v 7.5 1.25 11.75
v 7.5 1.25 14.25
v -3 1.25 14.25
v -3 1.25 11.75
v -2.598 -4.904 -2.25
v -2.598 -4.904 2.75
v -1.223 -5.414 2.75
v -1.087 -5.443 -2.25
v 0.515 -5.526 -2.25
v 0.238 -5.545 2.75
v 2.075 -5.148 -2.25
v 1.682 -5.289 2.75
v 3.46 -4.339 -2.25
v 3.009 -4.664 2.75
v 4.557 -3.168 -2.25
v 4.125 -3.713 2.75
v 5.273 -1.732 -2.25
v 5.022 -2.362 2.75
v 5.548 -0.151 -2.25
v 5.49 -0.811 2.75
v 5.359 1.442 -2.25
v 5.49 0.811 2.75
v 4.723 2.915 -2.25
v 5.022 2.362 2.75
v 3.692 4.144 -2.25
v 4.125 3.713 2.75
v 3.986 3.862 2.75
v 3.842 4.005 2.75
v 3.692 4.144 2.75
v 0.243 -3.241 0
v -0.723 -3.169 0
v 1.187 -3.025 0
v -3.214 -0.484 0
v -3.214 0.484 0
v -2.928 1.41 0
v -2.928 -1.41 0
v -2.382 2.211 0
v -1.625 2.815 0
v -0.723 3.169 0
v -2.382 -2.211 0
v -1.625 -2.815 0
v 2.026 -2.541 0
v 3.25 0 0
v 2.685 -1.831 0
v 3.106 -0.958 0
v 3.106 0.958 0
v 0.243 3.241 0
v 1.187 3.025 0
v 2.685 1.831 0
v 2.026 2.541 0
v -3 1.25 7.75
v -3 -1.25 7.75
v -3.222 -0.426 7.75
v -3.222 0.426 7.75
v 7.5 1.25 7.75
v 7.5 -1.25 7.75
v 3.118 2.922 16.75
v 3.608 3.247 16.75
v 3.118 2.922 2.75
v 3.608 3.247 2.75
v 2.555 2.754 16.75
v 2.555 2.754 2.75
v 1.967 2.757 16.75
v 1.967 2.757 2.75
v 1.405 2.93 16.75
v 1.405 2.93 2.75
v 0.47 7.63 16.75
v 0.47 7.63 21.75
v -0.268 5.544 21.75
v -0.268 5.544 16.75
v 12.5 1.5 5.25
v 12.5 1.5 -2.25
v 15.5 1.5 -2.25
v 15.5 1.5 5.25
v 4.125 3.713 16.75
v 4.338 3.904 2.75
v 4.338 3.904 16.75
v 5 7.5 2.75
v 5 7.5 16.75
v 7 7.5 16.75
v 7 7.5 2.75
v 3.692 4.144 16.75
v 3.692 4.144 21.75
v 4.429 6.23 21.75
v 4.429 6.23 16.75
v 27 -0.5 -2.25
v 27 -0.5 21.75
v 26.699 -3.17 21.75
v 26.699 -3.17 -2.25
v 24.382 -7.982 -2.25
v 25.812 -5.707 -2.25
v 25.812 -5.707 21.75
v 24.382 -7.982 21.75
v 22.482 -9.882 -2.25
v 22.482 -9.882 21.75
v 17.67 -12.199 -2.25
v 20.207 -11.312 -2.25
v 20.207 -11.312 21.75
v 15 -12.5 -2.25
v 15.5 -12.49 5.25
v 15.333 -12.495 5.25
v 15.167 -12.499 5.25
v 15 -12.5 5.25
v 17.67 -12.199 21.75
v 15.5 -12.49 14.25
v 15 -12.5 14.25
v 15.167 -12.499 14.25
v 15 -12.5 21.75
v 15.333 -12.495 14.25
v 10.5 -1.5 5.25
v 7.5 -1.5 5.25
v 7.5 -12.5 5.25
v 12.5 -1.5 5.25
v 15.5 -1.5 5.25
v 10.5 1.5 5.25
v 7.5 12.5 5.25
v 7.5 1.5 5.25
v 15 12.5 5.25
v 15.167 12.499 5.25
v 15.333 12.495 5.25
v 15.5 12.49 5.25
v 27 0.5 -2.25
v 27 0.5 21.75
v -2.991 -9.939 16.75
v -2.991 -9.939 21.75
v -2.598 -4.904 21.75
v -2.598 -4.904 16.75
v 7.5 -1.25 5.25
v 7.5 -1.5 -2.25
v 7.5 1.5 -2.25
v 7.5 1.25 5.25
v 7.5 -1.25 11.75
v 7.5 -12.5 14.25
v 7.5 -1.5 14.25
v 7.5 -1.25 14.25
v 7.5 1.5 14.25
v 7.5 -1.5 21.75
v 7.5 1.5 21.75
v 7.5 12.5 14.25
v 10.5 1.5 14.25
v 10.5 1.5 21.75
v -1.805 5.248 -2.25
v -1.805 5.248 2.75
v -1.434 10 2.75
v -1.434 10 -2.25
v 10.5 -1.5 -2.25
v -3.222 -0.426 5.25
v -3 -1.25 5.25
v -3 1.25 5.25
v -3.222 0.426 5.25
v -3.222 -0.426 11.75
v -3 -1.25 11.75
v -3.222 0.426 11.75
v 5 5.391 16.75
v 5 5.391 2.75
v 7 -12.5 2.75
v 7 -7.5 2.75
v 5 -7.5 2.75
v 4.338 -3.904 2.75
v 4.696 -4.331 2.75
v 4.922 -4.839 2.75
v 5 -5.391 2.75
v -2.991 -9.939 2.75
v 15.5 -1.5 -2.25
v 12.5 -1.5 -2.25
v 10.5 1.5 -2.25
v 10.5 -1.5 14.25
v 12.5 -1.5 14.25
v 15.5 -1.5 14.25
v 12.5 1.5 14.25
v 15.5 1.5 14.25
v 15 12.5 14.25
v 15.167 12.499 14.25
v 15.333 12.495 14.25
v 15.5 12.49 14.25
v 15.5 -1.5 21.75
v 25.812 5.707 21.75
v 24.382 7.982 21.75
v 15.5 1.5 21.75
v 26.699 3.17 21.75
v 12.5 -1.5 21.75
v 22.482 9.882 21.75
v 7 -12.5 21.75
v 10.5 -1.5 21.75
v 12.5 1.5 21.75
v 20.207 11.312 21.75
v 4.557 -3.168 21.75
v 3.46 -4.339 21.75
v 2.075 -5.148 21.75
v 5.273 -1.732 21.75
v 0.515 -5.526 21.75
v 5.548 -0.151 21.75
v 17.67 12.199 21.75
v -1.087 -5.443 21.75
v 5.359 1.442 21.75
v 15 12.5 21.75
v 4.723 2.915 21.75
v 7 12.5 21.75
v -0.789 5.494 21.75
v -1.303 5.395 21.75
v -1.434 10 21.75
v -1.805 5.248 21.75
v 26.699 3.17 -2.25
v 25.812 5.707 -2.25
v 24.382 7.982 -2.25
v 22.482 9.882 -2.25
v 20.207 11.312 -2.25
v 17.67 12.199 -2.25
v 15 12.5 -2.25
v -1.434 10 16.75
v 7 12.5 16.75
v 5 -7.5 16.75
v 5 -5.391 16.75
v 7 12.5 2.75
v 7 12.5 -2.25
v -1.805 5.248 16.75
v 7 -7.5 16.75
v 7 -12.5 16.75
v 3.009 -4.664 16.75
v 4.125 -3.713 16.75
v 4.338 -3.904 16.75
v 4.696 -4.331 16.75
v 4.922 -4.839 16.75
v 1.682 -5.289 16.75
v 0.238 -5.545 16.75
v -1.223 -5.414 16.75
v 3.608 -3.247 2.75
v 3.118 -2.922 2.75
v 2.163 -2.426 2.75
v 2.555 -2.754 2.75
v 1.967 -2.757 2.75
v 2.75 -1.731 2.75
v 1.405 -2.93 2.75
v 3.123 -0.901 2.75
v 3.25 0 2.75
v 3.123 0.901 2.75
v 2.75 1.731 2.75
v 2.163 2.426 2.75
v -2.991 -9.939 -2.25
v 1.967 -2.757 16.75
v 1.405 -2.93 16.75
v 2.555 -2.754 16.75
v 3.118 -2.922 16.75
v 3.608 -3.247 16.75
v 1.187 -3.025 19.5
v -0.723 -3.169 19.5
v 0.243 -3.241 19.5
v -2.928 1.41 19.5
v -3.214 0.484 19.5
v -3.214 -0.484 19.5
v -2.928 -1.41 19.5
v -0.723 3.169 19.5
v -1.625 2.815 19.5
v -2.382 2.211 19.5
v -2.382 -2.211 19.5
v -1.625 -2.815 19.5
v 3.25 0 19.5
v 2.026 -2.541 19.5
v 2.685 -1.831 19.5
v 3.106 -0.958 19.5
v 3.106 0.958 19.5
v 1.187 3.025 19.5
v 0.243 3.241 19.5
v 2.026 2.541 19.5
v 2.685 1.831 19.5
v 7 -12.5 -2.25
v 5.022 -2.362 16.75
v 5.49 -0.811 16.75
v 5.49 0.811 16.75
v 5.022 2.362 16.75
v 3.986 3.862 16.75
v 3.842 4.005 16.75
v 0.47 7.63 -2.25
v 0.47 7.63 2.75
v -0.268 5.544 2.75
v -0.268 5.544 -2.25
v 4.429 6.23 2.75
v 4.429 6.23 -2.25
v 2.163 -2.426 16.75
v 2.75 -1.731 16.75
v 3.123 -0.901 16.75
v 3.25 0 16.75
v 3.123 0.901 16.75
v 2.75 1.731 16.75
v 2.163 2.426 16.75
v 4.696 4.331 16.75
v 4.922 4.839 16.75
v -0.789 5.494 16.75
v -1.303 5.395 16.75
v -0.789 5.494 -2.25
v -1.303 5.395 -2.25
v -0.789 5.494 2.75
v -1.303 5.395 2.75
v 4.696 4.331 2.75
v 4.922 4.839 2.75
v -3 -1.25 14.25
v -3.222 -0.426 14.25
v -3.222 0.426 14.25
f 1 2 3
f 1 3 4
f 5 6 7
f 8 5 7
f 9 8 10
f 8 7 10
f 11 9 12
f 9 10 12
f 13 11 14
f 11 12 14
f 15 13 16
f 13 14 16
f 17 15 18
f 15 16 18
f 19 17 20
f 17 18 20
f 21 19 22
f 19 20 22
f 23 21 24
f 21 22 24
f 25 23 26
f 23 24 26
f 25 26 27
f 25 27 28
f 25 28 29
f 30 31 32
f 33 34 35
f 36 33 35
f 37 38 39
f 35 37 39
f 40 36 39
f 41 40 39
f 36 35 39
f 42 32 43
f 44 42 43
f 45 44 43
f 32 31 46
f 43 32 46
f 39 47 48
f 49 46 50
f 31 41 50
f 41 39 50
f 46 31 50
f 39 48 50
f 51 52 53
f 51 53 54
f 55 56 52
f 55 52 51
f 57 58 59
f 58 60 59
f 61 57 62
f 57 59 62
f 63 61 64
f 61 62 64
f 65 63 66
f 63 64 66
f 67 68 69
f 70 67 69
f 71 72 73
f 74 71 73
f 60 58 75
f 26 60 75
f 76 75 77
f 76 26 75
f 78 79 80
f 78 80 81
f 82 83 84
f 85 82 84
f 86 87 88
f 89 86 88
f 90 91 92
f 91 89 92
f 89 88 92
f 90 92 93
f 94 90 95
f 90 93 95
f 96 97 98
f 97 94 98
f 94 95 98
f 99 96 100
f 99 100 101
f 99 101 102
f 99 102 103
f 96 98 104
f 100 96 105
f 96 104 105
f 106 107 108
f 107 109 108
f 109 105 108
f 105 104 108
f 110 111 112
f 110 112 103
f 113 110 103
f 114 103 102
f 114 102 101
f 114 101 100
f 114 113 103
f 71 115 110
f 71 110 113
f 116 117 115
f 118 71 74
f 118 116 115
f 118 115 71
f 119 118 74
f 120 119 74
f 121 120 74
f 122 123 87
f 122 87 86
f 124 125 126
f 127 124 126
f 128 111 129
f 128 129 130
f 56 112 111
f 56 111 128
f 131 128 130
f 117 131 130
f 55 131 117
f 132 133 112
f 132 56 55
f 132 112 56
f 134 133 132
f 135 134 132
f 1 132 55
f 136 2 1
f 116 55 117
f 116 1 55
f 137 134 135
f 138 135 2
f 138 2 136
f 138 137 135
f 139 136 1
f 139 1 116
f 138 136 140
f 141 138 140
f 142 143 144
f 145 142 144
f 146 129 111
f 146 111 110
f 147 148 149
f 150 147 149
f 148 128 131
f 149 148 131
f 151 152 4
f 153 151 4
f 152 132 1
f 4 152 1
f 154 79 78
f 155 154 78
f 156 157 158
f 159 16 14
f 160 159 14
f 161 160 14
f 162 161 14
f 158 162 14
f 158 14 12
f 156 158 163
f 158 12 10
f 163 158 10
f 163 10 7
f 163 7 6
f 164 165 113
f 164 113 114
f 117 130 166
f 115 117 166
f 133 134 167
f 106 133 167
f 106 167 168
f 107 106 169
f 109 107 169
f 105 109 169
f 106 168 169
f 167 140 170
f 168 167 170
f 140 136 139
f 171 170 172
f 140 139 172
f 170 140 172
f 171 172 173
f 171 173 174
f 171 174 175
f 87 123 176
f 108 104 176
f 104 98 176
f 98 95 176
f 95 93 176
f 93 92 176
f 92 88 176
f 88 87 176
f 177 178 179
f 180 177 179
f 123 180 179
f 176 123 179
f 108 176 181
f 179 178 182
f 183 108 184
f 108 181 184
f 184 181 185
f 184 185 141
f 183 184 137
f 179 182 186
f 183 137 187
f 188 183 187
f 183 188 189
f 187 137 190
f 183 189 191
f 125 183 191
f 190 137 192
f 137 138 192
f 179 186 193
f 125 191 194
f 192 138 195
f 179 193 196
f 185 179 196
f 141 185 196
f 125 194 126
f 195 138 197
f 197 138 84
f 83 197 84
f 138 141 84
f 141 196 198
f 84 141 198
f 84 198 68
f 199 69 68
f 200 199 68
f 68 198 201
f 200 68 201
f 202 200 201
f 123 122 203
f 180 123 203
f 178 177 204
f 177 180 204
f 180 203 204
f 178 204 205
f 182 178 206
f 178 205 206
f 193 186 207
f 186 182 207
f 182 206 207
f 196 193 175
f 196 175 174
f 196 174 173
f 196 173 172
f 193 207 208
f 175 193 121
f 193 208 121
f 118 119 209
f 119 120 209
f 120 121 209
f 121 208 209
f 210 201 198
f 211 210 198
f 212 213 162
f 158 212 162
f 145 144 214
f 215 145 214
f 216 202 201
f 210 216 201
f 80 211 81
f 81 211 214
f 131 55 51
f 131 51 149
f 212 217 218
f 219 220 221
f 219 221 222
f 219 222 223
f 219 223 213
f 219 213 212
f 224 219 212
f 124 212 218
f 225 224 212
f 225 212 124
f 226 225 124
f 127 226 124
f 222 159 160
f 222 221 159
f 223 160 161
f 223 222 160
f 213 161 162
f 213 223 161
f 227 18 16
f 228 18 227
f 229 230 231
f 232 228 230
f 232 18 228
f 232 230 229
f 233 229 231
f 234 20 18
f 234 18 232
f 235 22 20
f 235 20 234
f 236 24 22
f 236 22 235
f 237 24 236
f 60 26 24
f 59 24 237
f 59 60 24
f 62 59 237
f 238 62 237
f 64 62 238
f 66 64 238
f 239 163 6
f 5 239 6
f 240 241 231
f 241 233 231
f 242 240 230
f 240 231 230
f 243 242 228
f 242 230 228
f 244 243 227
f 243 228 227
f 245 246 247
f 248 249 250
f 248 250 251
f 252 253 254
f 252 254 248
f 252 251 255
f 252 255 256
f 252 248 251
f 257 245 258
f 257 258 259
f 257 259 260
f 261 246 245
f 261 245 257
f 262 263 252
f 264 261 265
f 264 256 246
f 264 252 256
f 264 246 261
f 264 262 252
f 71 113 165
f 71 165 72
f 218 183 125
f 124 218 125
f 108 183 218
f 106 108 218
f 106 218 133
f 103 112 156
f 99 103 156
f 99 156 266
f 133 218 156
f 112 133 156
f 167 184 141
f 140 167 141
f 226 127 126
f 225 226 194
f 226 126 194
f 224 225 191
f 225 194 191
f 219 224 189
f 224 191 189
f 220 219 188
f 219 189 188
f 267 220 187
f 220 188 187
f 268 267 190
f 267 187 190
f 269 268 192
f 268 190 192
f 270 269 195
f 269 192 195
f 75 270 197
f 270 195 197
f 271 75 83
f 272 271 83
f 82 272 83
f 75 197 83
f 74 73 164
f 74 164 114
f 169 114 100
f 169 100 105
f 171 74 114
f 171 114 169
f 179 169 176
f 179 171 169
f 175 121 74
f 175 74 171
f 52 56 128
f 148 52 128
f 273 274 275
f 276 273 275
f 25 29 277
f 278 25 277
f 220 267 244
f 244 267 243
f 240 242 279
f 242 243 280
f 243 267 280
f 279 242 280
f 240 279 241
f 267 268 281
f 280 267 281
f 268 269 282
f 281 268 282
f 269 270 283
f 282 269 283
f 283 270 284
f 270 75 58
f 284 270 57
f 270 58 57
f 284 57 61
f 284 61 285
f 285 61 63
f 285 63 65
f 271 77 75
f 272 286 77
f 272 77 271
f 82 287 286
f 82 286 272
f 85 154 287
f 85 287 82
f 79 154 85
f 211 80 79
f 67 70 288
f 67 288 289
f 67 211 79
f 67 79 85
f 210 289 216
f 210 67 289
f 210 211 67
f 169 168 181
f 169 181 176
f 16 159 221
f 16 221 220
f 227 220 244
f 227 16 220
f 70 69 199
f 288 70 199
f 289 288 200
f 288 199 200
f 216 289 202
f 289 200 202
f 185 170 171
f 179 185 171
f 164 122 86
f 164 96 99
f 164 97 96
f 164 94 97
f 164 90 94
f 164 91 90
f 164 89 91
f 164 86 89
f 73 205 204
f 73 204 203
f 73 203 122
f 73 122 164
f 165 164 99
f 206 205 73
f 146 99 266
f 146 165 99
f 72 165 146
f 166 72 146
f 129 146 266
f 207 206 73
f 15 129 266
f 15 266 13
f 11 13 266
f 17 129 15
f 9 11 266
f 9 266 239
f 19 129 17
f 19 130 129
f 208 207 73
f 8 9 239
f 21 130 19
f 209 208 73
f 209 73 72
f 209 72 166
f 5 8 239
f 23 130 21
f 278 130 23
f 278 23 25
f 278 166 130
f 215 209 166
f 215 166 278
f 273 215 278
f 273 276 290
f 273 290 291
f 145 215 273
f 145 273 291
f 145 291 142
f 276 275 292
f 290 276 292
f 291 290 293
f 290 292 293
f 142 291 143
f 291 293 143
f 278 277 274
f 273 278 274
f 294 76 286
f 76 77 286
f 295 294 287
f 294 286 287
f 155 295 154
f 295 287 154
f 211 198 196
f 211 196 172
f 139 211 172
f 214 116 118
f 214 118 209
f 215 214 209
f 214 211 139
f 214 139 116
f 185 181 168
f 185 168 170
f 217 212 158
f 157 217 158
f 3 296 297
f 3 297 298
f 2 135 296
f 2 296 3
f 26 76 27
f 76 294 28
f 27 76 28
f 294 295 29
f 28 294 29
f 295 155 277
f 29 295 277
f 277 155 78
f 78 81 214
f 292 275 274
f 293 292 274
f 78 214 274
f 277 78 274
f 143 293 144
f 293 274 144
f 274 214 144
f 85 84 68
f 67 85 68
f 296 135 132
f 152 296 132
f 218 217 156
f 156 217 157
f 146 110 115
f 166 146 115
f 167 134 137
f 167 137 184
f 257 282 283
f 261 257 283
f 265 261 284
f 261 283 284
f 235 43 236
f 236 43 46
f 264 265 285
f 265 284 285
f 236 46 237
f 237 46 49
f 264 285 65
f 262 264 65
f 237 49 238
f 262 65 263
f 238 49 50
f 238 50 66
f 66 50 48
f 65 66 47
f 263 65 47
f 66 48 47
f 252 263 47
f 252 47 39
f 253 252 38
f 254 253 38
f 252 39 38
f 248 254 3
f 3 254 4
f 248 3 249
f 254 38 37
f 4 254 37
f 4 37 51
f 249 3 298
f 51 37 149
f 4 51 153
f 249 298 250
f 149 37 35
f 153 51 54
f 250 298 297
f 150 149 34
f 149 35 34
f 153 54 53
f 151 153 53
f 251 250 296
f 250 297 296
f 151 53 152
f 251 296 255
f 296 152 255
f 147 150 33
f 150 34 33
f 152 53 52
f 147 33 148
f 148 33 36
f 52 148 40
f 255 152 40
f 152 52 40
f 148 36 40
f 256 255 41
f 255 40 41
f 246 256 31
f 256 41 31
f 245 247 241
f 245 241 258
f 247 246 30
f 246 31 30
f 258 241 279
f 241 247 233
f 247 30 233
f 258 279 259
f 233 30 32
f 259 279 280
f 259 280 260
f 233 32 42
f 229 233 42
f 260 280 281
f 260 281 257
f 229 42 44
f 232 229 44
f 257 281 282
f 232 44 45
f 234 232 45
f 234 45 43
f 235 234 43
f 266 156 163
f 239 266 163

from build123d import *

# Parameters (mm, degrees)
SKETCH_1_R          = 3.25
EXTRUDE_1_DEPTH     = 19.5
SKETCH_2_W          = 14
SKETCH_2_H          = 15
EXTRUDE_2_DEPTH     = 2
EXTRUDE_3_DEPTH     = 14
FILLET_1_R          = 2
SKETCH_5_W          = 24
SKETCH_5_H          = 25
EXTRUDE_4_DEPTH     = 20
SKETCH_6_W          = 2.5
SKETCH_6_H          = 2.5
CUT_EXTRUDE_1_DEPTH = 40.298536868
SKETCH_7_W          = 3
SKETCH_7_H          = 3
CUT_EXTRUDE_2_DEPTH = 39.226299847
SKETCH_8_W          = 8
SKETCH_8_H          = 9
CUT_EXTRUDE_3_DEPTH = 43.744151647
SKETCH_9_W          = 2.5
SKETCH_9_H          = 2.5
EXTRUDE_5_DEPTH     = 11.5
FILLET_7_R          = 12
EXTRUDE_6_DEPTH     = 5
EXTRUDE_START       = -5
EXTRUDE_7_DEPTH     = 5


with BuildPart() as part:
    # ｽｹｯﾁ1 → ﾎﾞｽ - 押し出し1 (new body)
    with BuildSketch(Plane.XY):
        Circle(SKETCH_1_R)
    extrude(amount=EXTRUDE_1_DEPTH)



with BuildPart() as body_2:
    # ｽｹｯﾁ2 → ﾎﾞｽ - 押し出し2 (new body)
    with BuildSketch(Plane(origin=(5, 0, 0), x_dir=(0, 0, -1), z_dir=(1, 0, 0))):
        with Locations((-9.75, 0)):
            Rectangle(SKETCH_2_W, SKETCH_2_H)
    extrude(amount=EXTRUDE_2_DEPTH)


with BuildPart() as part_1:
    add(part.part)

    add(body_2.part)  # ﾎﾞｽ - 押し出し3 merges body 2
    # ｽｹｯﾁ3 → ﾎﾞｽ - 押し出し3 (add)
    with BuildSketch(Plane(origin=(0, 0, 2.75), x_dir=(-1, 0, 0), z_dir=(0, 0, -1))):
        Polygon((0, 0), (-5, 4.5), (-5, -4.5), align=None)
    extrude(amount=-EXTRUDE_3_DEPTH)

    # ﾌｨﾚｯﾄ1
    fillet_1_edges = [part_1.edges().sort_by_distance(p)[0] for p in [
        (2.415705975, 2.174135378, 9.75),
        (2.415705975, -2.174135378, 9.75),
        (5, 4.5, 9.75),
        (5, -4.5, 9.75),
    ]]
    fillet(fillet_1_edges, radius=FILLET_1_R)

    # ｽｹｯﾁ5 → ﾎﾞｽ - 押し出し4 (add)
    with BuildSketch(Plane(origin=(7, 0, 0), x_dir=(0, 0, -1), z_dir=(1, 0, 0))):
        with Locations((-9.75, 0)):
            Rectangle(SKETCH_5_W, SKETCH_5_H)
    extrude(amount=EXTRUDE_4_DEPTH)

    # ｽｹｯﾁ6 → ｶｯﾄ - 押し出し1 (cut, through all)
    with BuildSketch(Plane(origin=(27, 0, 0), x_dir=(0, 0, -1), z_dir=(1, 0, 0))):
        with Locations((-13, 0)):
            Rectangle(SKETCH_6_W, SKETCH_6_H)
        with Locations((-6.5, 0)):
            Rectangle(SKETCH_6_W, SKETCH_6_H)
    extrude(amount=-CUT_EXTRUDE_1_DEPTH, mode=Mode.SUBTRACT)

    # ｽｹｯﾁ7 → ｶｯﾄ - 押し出し2 (cut, through all)
    with BuildSketch(Plane.XY.offset(21.75)):
        with Locations((9, 0)):
            Rectangle(SKETCH_7_W, SKETCH_7_H)
        with Locations((14, 0)):
            Rectangle(SKETCH_7_W, SKETCH_7_H)
    extrude(amount=-CUT_EXTRUDE_2_DEPTH, mode=Mode.SUBTRACT)

    # ｽｹｯﾁ8 → ｶｯﾄ - 押し出し3 (cut, through all)
    with BuildSketch(Plane(origin=(0, 12.5, 0), x_dir=(1, 0, 0), z_dir=(0, 1, 0))):
        with Locations((11.5, -9.75)):
            Rectangle(SKETCH_8_W, SKETCH_8_H)
    extrude(amount=-CUT_EXTRUDE_3_DEPTH, mode=Mode.SUBTRACT)

    # ｽｹｯﾁ9 → ﾎﾞｽ - 押し出し5 (add)
    with BuildSketch(Plane.ZY.offset(-15.5)):
        with Locations((13, 0)):
            Rectangle(SKETCH_9_W, SKETCH_9_H)
        with Locations((6.5, 0)):
            Rectangle(SKETCH_9_W, SKETCH_9_H)
    extrude(amount=-EXTRUDE_5_DEPTH)

    # ﾌｨﾚｯﾄ7
    # the kernel refuses this fillet: 12 mm, written as the material it takes off along each edge
    with BuildSketch(Plane(origin=(27, -12.5, 51.75), x_dir=(-1, 0, 0), z_dir=(0, 0, -1))) as fillet_7_piece_1:
        with BuildLine():
            CenterArc((FILLET_7_R, FILLET_7_R), FILLET_7_R, 180, 90)
            Line((0, FILLET_7_R), (0, 0))
            Line((0, 0), (FILLET_7_R, 0))
        make_face()
    extrude(amount=84, mode=Mode.SUBTRACT)
    with BuildSketch(Plane(origin=(27, 12.5, -32.25), x_dir=(0, -1, 0), z_dir=(0, 0, 1))) as fillet_7_piece_2:
        with BuildLine():
            CenterArc((FILLET_7_R, -FILLET_7_R), FILLET_7_R, 90, 90)
            Line((0, -FILLET_7_R), (0, 0))
            Line((0, 0), (FILLET_7_R, 0))
        make_face()
    extrude(amount=84, mode=Mode.SUBTRACT)

    # ｽｹｯﾁ10 → ﾎﾞｽ - 押し出し6 (add)
    with BuildSketch(Plane(origin=(0, 0, 2.75), x_dir=(-1, 0, 0), z_dir=(0, 0, -1))):
        with BuildLine():
            Line((1.805058135, 5.248263058), (1.433861829, 10))
            Line((1.433861829, 10), (-7, 12.5))
            Line((-7, 12.5), (-7, -12.5))
            Line((-7, -12.5), (2.991476943, -9.939253626))
            Line((2.991476943, -9.939253626), (2.598155739, -4.904292687))
            ThreePointArc((2.598155739, -4.904292687), (-4.557007333, -3.167993713), (-3.692030902, 4.143839743))
            Line((-3.692030902, 4.143839743), (-4.42941418, 6.229991174))
            Line((-4.42941418, 6.229991174), (-0.469507268, 7.629683016))
            Line((-0.469507268, 7.629683016), (0.267876009, 5.543531586))
            ThreePointArc((0.267876009, 5.543531586), (1.046928779, 5.450361468), (1.805058135, 5.248263058))
        make_face()
    extrude(amount=EXTRUDE_6_DEPTH)

    # ｽｹｯﾁ11 → ﾎﾞｽ - 押し出し7 (add)
    with BuildSketch(Plane(origin=(0, 0, 16.75), x_dir=(-1, 0, 0), z_dir=(0, 0, -1)).offset(EXTRUDE_START)):
        with BuildLine():
            Line((1.805058135, 5.248263058), (1.433861829, 10))
            Line((1.433861829, 10), (-7, 12.5))
            Line((-7, 12.5), (-7, -12.5))
            Line((-7, -12.5), (2.991476943, -9.939253626))
            Line((2.991476943, -9.939253626), (2.598155739, -4.904292687))
            ThreePointArc((2.598155739, -4.904292687), (-4.557007333, -3.167993713), (-3.692030902, 4.143839743))
            Line((-3.692030902, 4.143839743), (-4.42941418, 6.229991174))
            Line((-4.42941418, 6.229991174), (-0.469507268, 7.629683016))
            Line((-0.469507268, 7.629683016), (0.267876009, 5.543531586))
            ThreePointArc((0.267876009, 5.543531586), (1.046928779, 5.450361468), (1.805058135, 5.248263058))
        make_face()
    extrude(amount=EXTRUDE_7_DEPTH)


solid = part_1.part
